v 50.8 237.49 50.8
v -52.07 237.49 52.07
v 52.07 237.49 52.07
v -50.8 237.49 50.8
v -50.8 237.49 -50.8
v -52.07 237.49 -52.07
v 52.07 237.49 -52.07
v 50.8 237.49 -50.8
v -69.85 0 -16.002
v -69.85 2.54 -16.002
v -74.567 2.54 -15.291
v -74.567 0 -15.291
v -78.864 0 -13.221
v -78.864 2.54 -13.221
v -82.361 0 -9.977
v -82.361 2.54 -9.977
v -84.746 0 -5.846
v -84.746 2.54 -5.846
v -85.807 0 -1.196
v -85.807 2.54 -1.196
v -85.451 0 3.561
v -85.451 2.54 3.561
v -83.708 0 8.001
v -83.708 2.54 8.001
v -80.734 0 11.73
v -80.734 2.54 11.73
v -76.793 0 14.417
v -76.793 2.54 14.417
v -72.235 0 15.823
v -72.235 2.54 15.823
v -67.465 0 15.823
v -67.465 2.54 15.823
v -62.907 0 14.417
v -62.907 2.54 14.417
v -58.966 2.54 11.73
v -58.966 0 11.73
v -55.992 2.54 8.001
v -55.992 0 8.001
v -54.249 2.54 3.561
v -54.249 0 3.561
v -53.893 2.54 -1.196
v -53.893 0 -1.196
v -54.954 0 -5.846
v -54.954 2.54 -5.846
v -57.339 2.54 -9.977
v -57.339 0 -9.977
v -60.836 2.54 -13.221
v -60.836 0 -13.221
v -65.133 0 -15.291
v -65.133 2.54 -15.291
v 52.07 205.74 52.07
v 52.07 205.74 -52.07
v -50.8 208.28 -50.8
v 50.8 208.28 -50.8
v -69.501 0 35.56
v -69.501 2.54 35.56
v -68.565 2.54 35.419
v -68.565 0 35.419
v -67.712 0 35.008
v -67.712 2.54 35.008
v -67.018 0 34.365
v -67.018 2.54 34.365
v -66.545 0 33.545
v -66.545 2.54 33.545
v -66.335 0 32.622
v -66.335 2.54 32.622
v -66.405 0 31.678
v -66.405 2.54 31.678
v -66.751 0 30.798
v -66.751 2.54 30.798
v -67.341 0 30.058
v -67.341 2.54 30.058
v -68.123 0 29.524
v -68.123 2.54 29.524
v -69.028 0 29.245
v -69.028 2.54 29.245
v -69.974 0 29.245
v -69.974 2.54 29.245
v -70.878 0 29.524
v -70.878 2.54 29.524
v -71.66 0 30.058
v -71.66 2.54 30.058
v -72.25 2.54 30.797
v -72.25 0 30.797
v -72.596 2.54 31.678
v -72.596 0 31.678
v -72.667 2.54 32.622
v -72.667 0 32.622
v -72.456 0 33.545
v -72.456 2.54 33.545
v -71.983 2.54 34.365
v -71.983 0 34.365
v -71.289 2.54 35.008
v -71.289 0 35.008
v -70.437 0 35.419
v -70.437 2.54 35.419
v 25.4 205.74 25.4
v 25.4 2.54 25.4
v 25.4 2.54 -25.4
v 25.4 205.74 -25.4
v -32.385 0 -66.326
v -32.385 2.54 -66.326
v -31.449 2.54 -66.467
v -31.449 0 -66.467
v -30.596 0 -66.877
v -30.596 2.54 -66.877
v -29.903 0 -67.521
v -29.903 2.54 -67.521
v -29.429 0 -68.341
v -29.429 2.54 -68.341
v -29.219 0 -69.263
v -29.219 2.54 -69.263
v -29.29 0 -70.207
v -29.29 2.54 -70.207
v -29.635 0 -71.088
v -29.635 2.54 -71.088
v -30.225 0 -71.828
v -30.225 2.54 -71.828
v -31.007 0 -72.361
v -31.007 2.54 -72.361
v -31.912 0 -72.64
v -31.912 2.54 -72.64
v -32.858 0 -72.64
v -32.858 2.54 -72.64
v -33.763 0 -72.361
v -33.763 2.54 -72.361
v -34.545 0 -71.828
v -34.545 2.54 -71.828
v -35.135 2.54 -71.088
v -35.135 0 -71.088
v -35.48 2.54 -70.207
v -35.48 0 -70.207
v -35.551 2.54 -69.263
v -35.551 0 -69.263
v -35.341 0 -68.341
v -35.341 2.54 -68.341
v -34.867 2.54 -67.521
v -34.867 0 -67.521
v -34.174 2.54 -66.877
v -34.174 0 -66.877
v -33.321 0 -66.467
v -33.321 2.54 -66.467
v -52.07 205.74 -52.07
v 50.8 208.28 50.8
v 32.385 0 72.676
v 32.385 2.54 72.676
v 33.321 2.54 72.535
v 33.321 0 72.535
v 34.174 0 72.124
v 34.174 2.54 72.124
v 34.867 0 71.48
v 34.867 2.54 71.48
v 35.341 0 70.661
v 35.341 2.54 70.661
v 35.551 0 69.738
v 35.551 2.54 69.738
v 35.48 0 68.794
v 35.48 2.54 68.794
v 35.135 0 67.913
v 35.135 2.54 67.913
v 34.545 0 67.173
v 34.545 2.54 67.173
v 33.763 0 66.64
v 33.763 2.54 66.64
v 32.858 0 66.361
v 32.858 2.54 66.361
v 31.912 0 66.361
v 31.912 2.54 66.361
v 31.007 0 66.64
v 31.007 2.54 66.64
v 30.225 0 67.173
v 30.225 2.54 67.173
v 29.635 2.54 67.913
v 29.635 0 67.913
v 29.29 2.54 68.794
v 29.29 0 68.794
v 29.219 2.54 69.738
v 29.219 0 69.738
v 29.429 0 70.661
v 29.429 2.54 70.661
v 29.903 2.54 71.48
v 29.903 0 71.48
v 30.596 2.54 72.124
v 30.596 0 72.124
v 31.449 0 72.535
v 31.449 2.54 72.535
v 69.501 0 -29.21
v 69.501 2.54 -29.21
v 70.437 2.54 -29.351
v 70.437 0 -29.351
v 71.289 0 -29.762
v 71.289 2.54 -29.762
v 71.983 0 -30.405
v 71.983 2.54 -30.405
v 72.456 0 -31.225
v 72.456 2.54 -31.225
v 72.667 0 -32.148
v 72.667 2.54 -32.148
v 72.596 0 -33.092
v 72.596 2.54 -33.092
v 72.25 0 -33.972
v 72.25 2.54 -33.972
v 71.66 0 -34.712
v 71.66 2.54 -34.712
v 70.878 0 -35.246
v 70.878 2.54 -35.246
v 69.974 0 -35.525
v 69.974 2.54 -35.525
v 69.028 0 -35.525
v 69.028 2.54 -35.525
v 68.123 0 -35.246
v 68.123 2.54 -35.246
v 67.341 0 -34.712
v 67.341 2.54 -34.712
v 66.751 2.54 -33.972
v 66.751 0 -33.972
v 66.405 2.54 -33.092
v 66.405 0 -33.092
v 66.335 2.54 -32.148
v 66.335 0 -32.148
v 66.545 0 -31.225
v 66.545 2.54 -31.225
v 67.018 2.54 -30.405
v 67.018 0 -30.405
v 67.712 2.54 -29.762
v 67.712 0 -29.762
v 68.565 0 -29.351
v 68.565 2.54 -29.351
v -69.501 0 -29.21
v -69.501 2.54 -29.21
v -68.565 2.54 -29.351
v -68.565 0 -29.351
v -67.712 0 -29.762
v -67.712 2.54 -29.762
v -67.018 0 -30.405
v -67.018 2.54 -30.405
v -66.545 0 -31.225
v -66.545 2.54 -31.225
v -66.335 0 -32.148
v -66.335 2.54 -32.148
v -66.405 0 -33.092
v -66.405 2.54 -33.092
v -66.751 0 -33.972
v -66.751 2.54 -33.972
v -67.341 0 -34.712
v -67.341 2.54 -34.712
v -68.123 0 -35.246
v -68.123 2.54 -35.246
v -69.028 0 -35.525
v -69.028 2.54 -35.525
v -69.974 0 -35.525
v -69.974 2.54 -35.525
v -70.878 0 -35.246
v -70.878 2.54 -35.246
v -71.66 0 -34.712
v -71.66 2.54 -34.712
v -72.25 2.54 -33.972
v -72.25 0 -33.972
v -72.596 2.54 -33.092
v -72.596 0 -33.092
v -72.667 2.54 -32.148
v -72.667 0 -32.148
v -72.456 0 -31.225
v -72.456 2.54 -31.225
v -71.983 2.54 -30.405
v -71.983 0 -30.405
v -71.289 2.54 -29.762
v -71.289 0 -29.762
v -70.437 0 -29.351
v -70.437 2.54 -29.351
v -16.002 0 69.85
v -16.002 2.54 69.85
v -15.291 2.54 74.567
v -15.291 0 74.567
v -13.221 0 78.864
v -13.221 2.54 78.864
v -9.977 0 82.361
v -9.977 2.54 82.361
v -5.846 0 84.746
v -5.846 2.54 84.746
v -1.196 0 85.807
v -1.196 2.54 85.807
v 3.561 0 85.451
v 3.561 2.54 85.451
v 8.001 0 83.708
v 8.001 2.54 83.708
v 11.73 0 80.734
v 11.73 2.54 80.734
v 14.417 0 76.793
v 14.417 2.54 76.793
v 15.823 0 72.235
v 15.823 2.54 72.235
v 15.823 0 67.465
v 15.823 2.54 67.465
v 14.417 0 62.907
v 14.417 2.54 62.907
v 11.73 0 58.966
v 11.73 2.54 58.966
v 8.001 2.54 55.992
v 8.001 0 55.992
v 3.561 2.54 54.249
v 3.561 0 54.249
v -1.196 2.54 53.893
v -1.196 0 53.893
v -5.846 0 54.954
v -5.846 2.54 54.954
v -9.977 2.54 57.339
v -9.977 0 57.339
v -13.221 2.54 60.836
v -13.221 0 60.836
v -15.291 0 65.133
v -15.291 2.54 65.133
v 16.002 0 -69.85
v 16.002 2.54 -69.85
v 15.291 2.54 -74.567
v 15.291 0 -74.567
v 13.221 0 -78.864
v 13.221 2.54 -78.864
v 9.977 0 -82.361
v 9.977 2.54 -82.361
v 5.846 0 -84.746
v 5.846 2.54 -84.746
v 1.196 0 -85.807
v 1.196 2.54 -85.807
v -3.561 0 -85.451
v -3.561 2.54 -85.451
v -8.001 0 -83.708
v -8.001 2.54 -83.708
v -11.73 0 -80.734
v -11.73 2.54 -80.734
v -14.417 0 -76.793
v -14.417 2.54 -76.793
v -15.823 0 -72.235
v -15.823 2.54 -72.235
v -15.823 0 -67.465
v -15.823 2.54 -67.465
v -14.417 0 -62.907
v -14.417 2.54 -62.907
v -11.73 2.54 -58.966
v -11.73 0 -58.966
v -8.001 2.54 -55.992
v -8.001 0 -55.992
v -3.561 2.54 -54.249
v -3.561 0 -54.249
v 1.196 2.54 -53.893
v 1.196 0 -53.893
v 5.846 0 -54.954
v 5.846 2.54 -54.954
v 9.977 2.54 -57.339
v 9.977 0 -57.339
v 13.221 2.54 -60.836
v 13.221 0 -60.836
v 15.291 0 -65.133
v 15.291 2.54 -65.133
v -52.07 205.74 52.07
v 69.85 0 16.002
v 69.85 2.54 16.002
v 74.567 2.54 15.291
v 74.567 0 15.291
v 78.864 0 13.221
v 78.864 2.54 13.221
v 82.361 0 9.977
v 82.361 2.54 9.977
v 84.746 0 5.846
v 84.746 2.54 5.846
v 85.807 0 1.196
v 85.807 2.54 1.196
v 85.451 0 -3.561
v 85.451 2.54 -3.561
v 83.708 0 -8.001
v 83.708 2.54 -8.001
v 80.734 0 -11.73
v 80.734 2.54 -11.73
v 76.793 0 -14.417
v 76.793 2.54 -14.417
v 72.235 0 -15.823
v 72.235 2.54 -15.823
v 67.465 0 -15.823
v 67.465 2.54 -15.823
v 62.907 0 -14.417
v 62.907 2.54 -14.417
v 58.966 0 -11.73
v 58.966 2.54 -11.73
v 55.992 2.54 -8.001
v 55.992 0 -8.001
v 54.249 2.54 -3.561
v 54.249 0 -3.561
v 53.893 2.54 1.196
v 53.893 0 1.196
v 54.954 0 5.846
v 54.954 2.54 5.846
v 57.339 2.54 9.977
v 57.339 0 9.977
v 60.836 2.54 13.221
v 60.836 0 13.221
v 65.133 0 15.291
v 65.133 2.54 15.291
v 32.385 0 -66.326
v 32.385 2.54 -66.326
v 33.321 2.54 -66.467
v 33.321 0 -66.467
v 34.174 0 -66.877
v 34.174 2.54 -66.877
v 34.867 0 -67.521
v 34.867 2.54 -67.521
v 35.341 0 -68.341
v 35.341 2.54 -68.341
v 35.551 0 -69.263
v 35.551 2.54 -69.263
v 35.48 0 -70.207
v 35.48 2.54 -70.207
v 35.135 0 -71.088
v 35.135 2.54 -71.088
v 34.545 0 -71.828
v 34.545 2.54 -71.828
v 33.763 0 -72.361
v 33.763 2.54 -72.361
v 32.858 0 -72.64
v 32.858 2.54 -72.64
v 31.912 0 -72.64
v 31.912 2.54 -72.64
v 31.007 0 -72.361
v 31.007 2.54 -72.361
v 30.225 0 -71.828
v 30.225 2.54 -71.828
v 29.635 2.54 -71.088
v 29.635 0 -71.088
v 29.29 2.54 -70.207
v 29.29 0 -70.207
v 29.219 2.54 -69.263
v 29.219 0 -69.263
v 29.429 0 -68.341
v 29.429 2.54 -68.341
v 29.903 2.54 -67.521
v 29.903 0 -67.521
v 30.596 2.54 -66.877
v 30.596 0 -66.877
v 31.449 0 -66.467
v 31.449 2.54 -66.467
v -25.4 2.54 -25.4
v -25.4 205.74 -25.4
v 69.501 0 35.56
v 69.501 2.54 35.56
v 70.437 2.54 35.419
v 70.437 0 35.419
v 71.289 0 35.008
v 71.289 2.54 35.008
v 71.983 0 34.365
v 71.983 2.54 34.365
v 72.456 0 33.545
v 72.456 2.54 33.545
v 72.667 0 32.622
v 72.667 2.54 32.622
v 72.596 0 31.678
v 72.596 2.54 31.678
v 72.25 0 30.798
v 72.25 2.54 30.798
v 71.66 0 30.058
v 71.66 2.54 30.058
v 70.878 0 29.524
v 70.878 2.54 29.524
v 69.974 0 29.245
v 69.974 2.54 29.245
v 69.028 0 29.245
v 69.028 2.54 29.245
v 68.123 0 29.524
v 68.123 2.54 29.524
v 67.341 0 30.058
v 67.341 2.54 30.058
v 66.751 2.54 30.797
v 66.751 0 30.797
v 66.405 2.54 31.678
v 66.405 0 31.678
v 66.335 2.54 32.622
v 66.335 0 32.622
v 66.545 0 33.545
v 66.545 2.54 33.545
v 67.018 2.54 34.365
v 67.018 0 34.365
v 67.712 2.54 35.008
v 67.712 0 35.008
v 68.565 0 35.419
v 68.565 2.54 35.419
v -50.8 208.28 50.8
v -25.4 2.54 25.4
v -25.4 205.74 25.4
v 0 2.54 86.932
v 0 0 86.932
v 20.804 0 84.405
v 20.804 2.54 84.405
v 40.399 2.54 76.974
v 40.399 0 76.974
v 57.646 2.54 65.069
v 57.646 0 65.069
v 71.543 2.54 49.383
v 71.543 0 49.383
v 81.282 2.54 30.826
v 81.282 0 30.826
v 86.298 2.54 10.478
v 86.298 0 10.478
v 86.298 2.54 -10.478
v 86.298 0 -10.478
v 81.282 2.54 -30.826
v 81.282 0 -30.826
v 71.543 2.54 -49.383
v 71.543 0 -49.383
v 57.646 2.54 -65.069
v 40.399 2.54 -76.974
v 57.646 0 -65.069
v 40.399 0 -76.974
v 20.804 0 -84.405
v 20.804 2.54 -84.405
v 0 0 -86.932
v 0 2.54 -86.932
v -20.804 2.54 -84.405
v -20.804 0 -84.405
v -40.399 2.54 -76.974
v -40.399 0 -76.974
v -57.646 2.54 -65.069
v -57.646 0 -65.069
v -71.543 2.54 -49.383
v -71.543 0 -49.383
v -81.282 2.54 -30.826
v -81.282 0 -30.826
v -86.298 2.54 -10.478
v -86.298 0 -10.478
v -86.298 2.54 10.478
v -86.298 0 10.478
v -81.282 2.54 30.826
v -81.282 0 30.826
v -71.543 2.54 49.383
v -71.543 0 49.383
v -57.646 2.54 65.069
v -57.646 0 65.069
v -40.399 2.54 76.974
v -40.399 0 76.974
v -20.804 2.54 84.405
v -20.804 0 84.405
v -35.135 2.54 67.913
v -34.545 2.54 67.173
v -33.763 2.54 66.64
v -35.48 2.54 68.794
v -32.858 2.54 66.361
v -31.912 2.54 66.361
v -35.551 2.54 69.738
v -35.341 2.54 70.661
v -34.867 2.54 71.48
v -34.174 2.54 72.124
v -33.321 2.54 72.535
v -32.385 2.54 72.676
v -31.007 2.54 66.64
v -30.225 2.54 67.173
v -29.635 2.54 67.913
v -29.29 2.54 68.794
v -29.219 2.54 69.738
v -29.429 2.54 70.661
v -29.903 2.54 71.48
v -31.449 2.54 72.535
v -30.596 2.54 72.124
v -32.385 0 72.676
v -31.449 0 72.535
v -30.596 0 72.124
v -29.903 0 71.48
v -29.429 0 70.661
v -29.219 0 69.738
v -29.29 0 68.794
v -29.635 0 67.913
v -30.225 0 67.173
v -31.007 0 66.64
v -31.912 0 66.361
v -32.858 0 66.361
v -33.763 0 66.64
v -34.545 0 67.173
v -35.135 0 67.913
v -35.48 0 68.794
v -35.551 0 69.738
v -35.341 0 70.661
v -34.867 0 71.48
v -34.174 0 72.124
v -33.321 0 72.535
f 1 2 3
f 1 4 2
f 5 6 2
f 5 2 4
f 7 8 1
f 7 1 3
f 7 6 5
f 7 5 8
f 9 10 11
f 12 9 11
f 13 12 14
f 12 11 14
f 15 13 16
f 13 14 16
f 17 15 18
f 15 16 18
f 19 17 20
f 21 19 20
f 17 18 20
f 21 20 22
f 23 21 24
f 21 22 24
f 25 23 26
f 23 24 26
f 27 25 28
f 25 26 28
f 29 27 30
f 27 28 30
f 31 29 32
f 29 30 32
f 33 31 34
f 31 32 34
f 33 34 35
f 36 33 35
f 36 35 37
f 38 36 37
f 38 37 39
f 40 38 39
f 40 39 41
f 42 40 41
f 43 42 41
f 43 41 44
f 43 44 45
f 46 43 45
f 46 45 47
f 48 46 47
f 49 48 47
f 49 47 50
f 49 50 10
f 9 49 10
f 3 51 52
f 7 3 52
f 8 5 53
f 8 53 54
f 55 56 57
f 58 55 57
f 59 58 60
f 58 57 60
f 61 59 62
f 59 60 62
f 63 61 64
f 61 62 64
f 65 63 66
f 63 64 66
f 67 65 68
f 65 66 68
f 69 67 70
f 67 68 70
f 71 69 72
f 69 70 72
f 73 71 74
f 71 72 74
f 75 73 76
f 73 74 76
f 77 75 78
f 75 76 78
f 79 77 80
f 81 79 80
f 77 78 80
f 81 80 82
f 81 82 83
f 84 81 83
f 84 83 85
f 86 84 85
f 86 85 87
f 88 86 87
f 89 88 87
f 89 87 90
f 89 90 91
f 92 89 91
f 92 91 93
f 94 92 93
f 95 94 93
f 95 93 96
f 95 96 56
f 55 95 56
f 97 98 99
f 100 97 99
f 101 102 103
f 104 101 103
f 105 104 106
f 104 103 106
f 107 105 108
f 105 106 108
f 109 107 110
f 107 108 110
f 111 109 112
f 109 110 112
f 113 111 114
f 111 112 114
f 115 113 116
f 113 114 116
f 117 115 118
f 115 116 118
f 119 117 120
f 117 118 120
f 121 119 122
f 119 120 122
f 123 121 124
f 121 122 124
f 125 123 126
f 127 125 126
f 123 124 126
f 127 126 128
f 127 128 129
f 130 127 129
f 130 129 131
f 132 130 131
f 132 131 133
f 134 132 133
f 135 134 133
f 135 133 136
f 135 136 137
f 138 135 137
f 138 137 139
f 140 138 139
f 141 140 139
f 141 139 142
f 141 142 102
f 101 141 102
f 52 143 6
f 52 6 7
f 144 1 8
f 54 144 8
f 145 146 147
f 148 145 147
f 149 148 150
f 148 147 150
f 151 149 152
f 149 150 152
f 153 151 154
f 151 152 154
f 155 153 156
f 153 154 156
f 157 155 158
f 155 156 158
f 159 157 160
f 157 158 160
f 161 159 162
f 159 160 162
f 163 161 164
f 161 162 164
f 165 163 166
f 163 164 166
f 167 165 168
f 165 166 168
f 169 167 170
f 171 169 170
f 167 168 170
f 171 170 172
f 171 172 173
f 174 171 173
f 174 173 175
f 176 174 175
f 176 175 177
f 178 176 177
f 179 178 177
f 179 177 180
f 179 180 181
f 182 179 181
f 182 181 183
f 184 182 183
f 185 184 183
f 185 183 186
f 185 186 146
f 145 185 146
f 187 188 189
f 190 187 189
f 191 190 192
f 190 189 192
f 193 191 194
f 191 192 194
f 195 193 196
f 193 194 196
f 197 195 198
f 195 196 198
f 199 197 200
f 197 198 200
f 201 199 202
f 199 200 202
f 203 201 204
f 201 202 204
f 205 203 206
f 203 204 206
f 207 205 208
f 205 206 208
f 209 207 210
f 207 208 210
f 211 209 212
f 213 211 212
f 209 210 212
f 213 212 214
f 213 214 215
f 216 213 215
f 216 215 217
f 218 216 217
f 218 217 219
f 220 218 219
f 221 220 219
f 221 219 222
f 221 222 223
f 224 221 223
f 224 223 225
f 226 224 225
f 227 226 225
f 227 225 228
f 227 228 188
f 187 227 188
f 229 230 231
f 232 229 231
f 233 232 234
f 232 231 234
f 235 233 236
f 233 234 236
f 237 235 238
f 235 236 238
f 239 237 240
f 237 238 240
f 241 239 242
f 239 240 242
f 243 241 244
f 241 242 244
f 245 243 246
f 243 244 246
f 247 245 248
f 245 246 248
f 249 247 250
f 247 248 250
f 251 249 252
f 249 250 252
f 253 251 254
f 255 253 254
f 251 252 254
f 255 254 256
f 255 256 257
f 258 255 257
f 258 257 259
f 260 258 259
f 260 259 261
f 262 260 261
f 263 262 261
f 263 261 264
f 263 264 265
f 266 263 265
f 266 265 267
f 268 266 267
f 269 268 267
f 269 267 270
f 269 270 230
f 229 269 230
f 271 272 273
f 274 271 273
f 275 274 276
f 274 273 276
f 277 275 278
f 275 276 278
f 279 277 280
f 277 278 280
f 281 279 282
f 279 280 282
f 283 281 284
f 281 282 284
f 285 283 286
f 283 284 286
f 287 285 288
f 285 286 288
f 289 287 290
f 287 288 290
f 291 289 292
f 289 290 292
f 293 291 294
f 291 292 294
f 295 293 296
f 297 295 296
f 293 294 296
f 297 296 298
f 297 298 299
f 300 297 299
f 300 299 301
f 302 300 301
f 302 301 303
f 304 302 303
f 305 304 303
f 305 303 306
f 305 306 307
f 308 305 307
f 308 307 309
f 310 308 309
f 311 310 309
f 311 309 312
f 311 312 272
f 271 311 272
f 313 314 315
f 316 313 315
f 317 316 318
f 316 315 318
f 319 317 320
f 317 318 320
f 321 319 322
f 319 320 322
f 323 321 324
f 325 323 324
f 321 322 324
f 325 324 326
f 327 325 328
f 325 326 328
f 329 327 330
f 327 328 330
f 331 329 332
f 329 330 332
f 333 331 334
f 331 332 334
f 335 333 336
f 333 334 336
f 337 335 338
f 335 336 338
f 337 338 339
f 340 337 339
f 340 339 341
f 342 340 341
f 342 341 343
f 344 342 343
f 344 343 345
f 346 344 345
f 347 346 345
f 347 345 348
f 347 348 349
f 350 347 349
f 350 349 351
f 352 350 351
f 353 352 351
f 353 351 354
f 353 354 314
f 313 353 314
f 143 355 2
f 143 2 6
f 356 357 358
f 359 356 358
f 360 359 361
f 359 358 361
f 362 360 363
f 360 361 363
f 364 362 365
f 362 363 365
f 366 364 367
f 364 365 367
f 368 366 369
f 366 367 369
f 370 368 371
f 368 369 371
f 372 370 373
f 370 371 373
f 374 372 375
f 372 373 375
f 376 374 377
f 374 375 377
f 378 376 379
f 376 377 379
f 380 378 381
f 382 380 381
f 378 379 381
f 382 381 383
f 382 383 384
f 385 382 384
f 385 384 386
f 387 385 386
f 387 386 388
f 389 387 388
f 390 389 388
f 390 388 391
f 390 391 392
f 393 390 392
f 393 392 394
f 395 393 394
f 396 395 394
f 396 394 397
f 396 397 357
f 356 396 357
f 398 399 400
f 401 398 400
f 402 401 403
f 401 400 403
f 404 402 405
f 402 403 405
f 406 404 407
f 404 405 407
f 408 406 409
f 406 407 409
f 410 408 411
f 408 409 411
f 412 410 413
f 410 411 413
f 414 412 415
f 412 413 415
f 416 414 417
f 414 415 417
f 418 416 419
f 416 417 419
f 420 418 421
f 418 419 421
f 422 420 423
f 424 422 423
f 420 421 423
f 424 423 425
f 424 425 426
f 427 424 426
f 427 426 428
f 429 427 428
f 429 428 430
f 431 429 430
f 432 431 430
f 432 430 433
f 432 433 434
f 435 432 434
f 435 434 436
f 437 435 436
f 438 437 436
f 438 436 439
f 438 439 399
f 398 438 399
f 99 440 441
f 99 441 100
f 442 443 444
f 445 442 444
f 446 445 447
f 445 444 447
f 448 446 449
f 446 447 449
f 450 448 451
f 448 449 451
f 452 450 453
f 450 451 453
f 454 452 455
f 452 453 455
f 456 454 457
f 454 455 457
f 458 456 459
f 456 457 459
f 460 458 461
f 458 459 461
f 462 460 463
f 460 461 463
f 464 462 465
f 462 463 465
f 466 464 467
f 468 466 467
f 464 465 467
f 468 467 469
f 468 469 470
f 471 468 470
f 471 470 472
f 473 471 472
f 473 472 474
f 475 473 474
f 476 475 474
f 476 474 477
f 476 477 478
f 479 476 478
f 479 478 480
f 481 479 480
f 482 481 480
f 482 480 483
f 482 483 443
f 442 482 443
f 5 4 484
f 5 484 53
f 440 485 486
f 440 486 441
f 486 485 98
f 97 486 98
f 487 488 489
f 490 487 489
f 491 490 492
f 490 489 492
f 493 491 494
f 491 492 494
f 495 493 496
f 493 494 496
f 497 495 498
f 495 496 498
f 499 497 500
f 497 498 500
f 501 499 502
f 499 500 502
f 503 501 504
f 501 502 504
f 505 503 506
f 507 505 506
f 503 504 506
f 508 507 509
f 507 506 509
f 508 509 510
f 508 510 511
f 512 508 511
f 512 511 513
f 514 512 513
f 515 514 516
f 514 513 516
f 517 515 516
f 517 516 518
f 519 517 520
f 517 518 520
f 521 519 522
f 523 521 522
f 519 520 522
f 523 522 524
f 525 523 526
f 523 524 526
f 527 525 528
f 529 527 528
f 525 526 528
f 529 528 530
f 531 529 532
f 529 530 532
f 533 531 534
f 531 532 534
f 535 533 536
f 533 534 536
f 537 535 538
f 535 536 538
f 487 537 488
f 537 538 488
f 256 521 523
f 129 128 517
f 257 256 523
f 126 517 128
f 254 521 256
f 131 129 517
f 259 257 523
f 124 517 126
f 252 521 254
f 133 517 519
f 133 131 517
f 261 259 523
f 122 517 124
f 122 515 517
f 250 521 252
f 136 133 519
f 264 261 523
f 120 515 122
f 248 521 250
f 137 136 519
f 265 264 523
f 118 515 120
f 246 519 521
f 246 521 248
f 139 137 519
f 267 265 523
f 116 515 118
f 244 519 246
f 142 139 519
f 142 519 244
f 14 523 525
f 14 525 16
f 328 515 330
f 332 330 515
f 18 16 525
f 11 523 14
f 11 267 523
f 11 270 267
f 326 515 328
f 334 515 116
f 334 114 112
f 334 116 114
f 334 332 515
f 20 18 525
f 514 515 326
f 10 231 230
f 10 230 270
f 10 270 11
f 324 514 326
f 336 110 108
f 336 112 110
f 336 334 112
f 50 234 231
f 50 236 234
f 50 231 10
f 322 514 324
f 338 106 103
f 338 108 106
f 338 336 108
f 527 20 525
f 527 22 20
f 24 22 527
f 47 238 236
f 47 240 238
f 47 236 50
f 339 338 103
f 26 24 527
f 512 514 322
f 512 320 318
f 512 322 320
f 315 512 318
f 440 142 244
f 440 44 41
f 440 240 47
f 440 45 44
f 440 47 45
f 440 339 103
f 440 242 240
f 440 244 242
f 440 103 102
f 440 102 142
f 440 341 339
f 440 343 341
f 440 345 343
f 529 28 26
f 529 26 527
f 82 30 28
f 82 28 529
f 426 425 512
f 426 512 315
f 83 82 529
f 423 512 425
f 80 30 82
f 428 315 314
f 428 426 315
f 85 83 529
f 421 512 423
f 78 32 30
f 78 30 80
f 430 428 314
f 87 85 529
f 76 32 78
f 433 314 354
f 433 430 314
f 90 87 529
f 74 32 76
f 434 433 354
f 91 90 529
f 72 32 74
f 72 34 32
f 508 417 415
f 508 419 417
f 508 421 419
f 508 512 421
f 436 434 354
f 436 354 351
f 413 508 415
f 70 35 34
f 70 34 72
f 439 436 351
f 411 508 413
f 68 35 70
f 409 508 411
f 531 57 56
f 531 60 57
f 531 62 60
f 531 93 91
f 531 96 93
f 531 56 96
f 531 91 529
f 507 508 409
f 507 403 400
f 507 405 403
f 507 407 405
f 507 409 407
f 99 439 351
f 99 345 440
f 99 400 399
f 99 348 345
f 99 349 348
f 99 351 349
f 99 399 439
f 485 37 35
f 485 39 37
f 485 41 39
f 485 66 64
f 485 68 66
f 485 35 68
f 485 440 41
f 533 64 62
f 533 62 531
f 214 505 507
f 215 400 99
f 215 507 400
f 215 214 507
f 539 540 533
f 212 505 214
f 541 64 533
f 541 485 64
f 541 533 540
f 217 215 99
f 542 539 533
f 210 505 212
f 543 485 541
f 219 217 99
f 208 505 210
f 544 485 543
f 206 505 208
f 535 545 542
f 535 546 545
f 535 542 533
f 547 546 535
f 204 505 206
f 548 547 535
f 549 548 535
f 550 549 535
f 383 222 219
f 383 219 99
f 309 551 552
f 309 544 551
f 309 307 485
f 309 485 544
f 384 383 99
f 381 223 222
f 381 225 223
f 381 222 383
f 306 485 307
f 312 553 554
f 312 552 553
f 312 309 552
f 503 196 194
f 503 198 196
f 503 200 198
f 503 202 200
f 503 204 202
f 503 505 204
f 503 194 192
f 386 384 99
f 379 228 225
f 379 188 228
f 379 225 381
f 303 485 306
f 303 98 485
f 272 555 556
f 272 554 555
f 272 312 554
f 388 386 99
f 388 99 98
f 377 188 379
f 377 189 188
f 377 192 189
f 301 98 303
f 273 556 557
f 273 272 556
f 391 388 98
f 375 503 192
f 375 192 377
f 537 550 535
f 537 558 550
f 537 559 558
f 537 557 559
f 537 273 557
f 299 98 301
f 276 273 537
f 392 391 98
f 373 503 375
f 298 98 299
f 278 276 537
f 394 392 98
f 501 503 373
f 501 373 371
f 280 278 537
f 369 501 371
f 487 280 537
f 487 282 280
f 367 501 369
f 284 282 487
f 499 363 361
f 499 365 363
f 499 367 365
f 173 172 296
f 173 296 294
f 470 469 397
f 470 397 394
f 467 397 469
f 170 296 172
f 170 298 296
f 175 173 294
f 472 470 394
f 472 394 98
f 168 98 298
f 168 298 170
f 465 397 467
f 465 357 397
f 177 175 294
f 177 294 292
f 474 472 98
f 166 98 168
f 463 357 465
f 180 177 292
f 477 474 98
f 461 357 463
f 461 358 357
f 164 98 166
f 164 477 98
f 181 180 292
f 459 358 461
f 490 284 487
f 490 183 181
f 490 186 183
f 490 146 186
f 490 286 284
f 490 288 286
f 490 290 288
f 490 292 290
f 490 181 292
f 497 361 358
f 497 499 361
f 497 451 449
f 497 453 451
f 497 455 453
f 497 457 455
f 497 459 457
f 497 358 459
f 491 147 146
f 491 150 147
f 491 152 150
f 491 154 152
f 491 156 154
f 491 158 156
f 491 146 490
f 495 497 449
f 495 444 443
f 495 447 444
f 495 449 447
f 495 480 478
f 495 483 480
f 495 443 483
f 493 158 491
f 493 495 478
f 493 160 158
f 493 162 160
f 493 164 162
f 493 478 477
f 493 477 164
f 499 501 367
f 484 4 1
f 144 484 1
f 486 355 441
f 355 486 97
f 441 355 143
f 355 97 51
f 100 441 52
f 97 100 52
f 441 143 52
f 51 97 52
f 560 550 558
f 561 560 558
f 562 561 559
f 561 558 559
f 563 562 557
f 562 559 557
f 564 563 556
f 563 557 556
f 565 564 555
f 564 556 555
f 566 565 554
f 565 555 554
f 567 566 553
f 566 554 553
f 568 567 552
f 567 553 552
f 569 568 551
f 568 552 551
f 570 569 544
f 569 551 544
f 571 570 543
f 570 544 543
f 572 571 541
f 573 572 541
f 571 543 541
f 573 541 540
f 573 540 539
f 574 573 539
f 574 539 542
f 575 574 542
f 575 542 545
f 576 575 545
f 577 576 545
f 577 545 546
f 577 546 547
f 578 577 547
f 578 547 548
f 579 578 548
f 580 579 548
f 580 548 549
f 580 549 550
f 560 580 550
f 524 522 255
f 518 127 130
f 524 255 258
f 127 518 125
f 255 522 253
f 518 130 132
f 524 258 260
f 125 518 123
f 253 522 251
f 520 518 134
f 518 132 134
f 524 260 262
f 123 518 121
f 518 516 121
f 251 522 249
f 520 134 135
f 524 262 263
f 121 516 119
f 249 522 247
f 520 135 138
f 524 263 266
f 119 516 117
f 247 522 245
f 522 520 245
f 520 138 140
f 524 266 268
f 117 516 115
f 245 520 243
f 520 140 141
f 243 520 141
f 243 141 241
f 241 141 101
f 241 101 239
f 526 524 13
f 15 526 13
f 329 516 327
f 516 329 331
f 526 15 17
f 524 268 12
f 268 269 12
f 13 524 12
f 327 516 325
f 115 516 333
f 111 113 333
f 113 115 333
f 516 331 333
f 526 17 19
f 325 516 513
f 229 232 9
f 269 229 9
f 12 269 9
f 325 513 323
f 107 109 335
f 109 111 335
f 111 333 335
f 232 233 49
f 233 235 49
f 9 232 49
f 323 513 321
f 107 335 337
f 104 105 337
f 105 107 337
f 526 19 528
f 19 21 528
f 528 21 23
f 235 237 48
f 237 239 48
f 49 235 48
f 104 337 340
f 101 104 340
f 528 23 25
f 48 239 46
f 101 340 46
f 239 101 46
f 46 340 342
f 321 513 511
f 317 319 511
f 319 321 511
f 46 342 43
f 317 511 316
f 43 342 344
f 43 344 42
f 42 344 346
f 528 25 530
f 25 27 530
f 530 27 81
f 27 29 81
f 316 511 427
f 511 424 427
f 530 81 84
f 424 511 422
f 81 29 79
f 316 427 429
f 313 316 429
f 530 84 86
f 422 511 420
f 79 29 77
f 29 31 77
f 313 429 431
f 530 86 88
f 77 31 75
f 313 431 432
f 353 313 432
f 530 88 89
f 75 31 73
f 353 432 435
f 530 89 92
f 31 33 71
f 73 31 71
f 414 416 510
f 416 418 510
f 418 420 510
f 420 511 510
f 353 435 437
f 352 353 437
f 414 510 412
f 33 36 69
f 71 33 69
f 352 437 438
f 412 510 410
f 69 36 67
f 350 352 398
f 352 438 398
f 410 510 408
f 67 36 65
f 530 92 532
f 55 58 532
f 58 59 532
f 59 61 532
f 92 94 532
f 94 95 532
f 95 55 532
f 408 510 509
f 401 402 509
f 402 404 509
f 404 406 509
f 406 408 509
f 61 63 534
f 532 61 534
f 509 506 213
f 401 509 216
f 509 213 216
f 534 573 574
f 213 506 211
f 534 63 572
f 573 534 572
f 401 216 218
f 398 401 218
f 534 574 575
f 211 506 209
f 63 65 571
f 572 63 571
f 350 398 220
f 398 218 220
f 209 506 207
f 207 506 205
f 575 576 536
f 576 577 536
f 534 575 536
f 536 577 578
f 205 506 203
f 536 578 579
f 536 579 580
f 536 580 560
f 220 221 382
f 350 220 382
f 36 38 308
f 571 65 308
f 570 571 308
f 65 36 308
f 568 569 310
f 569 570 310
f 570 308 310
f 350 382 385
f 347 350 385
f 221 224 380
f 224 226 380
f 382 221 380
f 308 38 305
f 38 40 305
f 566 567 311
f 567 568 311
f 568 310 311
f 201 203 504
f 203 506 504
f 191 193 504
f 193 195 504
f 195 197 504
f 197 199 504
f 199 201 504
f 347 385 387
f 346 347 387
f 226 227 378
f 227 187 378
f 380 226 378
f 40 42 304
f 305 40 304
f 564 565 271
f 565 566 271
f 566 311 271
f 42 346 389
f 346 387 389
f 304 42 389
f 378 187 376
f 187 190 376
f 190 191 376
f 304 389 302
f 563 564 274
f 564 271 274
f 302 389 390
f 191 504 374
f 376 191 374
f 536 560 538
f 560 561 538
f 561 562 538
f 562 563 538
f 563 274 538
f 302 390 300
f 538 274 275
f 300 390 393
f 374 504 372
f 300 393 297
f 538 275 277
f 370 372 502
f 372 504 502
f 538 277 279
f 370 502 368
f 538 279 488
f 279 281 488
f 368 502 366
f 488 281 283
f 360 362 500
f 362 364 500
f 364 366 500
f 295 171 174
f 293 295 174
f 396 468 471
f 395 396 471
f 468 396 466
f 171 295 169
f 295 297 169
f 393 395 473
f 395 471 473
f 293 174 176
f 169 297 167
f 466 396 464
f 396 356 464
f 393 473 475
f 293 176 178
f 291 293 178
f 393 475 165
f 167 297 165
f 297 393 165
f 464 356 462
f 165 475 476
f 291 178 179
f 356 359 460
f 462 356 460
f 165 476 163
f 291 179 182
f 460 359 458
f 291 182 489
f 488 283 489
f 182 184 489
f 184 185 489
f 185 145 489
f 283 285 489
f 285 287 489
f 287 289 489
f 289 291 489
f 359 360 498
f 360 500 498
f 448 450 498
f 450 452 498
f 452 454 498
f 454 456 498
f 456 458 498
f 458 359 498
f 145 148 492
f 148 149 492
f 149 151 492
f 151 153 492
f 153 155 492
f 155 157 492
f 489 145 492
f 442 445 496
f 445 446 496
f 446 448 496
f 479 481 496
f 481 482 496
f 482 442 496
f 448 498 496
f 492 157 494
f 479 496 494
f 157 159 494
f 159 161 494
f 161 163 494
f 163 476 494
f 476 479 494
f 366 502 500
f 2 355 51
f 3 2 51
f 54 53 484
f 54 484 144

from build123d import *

# Parameters (mm, degrees)
SKETCH1_R           = 86.9315
BOSS_EXTRUDE1_DEPTH = 2.54
SKETCH2_W           = 50.8
SKETCH2_H           = 50.8
BOSS_EXTRUDE2_DEPTH = 203.2
SKETCH3_R           = 3.175
CUT_EXTRUDE1_DEPTH  = 203.2
SKETCH4_W           = 104.14
SKETCH4_H           = 104.14
BOSS_EXTRUDE3_DEPTH = 31.75
SKETCH5_W           = 101.6
SKETCH5_H           = 101.6
CUT_EXTRUDE2_DEPTH  = 29.21
SKETCH9_R           = 16.002
CUT_EXTRUDE3_DEPTH  = 266.171027611
CIRPATTERN1_COUNT   = 4


with BuildPart() as part:
    # Sketch1 → Boss-Extrude1 (new body)
    with BuildSketch(Plane(origin=(0, 0, 0), x_dir=(1, 0, 0), z_dir=(0, 1, 0))):
        with Locations(Location((0, 0, 0), (0, 0, 270))):
            Circle(SKETCH1_R)
    extrude(amount=BOSS_EXTRUDE1_DEPTH)

    # Sketch2 → Boss-Extrude2 (add)
    with BuildSketch(Plane(origin=(0, 2.54, 0), x_dir=(1, 0, 0), z_dir=(0, 1, 0))):
        Rectangle(SKETCH2_W, SKETCH2_H)
    extrude(amount=BOSS_EXTRUDE2_DEPTH)

    # Sketch3 → Cut-Extrude1 (cut)
    with BuildSketch(Plane(origin=(0, 2.54, 0), x_dir=(1, 0, 0), z_dir=(0, 1, 0))):
        with Locations(Location((-32.385, 69.50075, 0), (0, 0, 270))):
            Circle(SKETCH3_R)
        with Locations(Location((32.385, 69.50075, 0), (0, 0, 270))):
            Circle(SKETCH3_R)
        with Locations(Location((69.50075, 32.385, 0), (0, 0, 270))):
            Circle(SKETCH3_R)
        with Locations(Location((69.50075, -32.385, 0), (0, 0, 270))):
            Circle(SKETCH3_R)
        with Locations(Location((32.385, -69.50075, 0), (0, 0, 270))):
            Circle(SKETCH3_R)
        with Locations(Location((-32.385, -69.50075, 0), (0, 0, 270))):
            Circle(SKETCH3_R)
        with Locations(Location((-69.50075, -32.385, 0), (0, 0, 270))):
            Circle(SKETCH3_R)
        with Locations(Location((-69.50075, 32.385, 0), (0, 0, 270))):
            Circle(SKETCH3_R)
    extrude(amount=-CUT_EXTRUDE1_DEPTH, mode=Mode.SUBTRACT)

    # Sketch4 → Boss-Extrude3 (add)
    with BuildSketch(Plane(origin=(0, 205.74, 0), x_dir=(1, 0, 0), z_dir=(0, 1, 0))):
        Rectangle(SKETCH4_W, SKETCH4_H)
    extrude(amount=BOSS_EXTRUDE3_DEPTH)

    # Sketch5 → Cut-Extrude2 (cut)
    with BuildSketch(Plane(origin=(0, 237.49, 0), x_dir=(1, 0, 0), z_dir=(0, 1, 0))):
        Rectangle(SKETCH5_W, SKETCH5_H)
    extrude(amount=-CUT_EXTRUDE2_DEPTH, mode=Mode.SUBTRACT)

    # Sketch9 → Cut-Extrude3 (cut, through all)
    with BuildSketch(Plane(origin=(0, 2.54, 0), x_dir=(1, 0, 0), z_dir=(0, 1, 0))):
        with Locations(Location((69.85, 0, 0), (0, 0, 270))):
            Circle(SKETCH9_R)
    cut_extrude3 = extrude(amount=-CUT_EXTRUDE3_DEPTH, mode=Mode.SUBTRACT)

    # CirPattern1: Cut-Extrude3 ×4 about axis
    cirpattern1_axis = Axis((0, 0, 0), (0, 1, 0))
    for i in range(1, CIRPATTERN1_COUNT):
        add(cut_extrude3.rotate(cirpattern1_axis, i * 360 / CIRPATTERN1_COUNT), mode=Mode.SUBTRACT)


solid = part.part
